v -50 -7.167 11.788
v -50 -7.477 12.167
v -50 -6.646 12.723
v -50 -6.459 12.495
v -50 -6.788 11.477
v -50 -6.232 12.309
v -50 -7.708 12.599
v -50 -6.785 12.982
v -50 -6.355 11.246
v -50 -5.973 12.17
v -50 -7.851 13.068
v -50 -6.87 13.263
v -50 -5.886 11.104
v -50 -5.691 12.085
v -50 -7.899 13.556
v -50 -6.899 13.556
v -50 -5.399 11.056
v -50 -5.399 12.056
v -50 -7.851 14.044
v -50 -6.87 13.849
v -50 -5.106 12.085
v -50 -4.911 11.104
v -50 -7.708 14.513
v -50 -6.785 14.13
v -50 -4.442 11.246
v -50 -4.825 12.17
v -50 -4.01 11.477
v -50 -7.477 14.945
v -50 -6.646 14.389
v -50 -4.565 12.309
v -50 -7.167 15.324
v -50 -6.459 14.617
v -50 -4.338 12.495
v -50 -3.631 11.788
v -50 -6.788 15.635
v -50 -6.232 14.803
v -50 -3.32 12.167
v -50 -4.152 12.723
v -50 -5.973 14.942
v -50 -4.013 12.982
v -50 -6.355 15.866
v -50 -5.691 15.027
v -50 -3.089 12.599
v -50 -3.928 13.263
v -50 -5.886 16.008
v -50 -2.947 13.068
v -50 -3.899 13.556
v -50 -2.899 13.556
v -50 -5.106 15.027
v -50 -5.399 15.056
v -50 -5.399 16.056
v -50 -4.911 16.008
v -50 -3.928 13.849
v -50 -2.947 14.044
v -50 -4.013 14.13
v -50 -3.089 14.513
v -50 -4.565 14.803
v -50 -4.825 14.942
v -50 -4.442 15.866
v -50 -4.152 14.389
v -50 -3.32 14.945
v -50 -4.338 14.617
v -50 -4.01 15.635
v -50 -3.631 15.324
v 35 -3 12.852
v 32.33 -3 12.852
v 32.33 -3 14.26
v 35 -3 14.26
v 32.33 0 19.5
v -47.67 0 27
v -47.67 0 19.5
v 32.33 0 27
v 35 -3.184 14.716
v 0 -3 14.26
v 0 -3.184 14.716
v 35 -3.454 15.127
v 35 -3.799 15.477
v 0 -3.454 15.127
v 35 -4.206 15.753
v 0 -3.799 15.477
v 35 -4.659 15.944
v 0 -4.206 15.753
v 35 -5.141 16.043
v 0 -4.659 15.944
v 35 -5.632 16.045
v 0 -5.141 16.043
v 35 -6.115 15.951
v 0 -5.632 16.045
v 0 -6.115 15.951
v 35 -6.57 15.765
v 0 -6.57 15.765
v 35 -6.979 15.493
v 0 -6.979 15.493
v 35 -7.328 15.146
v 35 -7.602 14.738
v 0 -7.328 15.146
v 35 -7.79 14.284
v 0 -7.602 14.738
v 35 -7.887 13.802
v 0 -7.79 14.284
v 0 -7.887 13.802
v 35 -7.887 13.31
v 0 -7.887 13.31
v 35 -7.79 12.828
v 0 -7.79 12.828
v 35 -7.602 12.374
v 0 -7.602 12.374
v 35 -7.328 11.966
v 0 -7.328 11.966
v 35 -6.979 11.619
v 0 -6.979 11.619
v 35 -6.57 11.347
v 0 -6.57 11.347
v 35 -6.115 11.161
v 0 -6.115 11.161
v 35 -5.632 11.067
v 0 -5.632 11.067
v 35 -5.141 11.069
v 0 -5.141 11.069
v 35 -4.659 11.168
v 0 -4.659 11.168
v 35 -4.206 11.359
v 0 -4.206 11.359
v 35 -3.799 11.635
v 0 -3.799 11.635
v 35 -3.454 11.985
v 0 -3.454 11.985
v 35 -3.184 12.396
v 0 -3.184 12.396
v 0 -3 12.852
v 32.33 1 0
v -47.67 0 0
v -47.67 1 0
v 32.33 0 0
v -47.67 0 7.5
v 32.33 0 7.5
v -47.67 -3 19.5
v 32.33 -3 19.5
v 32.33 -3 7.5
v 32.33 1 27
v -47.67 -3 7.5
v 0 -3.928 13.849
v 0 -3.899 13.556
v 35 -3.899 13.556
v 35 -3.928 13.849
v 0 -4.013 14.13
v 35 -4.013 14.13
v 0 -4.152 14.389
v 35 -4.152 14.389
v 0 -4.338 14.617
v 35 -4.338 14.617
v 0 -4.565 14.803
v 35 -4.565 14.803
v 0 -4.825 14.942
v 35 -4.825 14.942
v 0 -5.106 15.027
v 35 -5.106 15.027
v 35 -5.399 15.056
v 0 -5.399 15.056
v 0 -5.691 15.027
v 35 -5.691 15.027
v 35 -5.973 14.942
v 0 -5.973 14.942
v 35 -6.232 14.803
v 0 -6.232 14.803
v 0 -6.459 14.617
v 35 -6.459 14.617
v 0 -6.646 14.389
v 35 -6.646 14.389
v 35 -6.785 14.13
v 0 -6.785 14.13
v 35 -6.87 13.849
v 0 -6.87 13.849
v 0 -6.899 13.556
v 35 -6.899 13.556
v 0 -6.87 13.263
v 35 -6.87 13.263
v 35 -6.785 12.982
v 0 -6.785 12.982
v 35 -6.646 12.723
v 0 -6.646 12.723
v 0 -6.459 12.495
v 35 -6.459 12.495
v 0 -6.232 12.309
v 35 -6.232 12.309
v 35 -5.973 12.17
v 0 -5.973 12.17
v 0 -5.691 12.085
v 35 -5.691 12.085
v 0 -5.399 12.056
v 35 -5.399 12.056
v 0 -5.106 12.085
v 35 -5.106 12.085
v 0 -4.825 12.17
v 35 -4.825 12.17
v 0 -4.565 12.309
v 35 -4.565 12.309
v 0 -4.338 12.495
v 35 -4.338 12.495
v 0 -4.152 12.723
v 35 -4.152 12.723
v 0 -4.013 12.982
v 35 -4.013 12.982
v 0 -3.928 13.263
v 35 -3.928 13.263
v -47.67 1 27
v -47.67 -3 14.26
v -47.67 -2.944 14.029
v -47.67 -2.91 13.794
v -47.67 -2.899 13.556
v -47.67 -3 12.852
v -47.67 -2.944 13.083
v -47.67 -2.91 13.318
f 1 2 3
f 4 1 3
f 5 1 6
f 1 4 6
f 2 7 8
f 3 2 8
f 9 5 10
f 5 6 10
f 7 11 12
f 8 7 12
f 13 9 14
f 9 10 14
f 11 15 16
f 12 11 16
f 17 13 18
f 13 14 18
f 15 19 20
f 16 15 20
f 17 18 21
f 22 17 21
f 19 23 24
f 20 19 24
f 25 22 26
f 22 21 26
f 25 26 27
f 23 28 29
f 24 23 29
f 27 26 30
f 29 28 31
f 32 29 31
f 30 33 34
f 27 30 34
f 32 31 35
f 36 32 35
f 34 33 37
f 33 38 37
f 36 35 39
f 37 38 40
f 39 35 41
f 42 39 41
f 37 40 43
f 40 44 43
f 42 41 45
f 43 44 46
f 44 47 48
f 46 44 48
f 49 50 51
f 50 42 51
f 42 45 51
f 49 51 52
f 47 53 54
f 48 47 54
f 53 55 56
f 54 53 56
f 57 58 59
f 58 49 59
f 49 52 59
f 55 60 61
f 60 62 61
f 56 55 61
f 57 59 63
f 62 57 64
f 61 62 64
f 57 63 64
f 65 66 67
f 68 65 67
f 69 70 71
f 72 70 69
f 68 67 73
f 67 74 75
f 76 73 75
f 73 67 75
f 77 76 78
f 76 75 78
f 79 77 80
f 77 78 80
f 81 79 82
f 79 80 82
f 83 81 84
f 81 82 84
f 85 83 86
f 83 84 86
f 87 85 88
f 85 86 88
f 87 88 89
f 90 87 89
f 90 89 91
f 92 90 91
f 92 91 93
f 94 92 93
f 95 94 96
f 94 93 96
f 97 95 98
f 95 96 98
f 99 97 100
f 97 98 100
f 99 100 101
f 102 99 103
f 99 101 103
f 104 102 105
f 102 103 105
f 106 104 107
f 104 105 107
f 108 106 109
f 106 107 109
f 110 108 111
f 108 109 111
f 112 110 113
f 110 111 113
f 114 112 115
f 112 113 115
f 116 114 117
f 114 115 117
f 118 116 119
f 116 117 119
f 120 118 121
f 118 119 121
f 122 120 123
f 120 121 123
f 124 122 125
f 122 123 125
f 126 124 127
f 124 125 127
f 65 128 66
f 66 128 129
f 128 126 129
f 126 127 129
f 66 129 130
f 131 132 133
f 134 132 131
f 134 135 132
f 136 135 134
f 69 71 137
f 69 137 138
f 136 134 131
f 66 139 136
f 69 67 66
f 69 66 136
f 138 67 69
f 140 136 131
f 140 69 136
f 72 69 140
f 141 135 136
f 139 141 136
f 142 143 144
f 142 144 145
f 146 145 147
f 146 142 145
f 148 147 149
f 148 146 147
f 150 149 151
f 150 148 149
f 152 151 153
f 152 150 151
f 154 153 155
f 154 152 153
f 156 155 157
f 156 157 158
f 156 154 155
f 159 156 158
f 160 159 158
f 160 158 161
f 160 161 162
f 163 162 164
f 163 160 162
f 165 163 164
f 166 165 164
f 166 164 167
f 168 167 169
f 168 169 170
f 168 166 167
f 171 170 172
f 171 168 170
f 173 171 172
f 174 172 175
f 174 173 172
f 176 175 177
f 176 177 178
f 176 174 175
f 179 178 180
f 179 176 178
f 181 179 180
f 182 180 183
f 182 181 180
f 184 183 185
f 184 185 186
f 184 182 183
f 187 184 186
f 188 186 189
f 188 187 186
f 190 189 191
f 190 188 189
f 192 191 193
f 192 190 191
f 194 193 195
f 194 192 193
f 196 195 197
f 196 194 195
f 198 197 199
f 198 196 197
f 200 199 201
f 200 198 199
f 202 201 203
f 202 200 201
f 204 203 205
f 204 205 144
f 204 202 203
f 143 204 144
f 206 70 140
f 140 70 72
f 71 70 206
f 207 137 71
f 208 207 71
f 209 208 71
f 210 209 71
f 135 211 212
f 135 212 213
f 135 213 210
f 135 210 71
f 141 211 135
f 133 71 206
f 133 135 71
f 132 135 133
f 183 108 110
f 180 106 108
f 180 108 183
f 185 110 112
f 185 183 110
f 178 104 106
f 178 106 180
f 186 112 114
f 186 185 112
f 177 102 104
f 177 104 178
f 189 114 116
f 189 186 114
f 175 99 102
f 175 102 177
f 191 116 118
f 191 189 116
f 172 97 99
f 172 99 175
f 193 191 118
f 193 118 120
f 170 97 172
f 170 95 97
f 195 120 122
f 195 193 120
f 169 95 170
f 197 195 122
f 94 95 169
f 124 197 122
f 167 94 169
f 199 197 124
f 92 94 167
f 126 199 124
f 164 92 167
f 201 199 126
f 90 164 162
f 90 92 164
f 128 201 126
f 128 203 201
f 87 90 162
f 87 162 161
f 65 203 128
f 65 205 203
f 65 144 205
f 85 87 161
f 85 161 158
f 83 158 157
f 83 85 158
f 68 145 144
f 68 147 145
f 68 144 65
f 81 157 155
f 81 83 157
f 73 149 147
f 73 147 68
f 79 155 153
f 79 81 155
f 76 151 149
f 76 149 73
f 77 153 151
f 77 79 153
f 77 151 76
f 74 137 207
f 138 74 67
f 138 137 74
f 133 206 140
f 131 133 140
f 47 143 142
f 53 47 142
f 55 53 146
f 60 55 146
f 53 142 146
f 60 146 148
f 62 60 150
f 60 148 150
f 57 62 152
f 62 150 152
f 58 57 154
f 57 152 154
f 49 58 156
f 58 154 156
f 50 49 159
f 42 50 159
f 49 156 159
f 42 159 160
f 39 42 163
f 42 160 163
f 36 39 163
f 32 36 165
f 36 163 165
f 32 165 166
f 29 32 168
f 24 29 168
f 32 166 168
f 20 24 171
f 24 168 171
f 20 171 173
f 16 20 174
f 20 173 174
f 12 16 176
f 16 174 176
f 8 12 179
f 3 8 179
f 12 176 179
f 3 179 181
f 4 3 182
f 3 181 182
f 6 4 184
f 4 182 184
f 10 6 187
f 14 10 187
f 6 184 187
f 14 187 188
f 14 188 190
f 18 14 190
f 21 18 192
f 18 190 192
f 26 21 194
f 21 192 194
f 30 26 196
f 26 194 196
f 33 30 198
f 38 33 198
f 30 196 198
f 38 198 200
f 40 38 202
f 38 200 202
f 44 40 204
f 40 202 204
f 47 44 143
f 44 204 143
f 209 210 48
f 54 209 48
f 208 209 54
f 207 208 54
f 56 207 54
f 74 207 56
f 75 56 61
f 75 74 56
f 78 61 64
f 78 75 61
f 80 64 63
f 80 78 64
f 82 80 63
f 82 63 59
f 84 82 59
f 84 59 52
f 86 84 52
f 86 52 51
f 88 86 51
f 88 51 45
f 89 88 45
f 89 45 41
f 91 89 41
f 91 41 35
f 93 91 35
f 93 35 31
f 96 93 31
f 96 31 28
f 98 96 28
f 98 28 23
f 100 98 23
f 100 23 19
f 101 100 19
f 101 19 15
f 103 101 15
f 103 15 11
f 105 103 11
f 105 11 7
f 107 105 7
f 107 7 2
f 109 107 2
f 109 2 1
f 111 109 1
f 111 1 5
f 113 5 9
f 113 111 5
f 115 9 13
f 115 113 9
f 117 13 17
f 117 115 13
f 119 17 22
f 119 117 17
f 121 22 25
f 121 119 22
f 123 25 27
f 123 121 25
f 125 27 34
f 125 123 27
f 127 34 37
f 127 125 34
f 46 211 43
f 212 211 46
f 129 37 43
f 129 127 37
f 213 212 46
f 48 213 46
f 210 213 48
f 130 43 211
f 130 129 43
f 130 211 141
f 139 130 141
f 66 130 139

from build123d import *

# Parameters (mm, degrees)
F0_W      = 80
F0_H      = 6
F1_DEPTH  = 3
F0_H_2    = 7.5
F2_DEPTH  = 1
F3_R      = 2.5
F3_R_2    = 1.5
F4_DEPTH  = 50
F4_FACE_R = 1.5
F5_DEPTH  = 35


with BuildPart() as f1:
    # F0 (on Front) → F1 (new body)
    with BuildSketch(Plane.XZ):
        with Locations((-7.669735, 16.5)):
            Rectangle(F0_W, F0_H)
        with Locations((-7.669735, 10.5)):
            Rectangle(F0_W, F0_H)
    extrude(amount=F1_DEPTH)

    # F0 (on Front) → F2 (join)
    with BuildSketch(Plane.XZ):
        with Locations((-7.669735, 23.25)):
            Rectangle(F0_W, F0_H_2)
        with Locations((-7.669735, 3.75)):
            Rectangle(F0_W, F0_H_2)
        with Locations((-7.669735, 10.5)):
            Rectangle(F0_W, F0_H)
        with Locations((-7.669735, 16.5)):
            Rectangle(F0_W, F0_H)
    extrude(amount=-F2_DEPTH)

    # F3 (on Right) → F4 (join)
    with BuildSketch(Plane.YZ):
        with Locations((-5.398772, 13.555951)):
            Circle(F3_R)
        with Locations((-5.398772, 13.555951)):
            Circle(F3_R_2, mode=Mode.SUBTRACT)
    extrude(amount=-F4_DEPTH)

    # F4_face (on face) → F5 (join)
    with BuildSketch(Plane(origin=(0, -5.41744, 13.555951), x_dir=(0, 1, 0), z_dir=(1, 0, 0))):
        with BuildLine():
            Line((2.41744, -0.704196), (2.41744, 0.704196))
            ThreePointArc((2.41744, 0.704196), (-2.481332, 0), (2.41744, -0.704196))
        make_face()
        with Locations((0.018668, 0)):
            Circle(F4_FACE_R, mode=Mode.SUBTRACT)
    extrude(amount=F5_DEPTH)


solid = f1.part
